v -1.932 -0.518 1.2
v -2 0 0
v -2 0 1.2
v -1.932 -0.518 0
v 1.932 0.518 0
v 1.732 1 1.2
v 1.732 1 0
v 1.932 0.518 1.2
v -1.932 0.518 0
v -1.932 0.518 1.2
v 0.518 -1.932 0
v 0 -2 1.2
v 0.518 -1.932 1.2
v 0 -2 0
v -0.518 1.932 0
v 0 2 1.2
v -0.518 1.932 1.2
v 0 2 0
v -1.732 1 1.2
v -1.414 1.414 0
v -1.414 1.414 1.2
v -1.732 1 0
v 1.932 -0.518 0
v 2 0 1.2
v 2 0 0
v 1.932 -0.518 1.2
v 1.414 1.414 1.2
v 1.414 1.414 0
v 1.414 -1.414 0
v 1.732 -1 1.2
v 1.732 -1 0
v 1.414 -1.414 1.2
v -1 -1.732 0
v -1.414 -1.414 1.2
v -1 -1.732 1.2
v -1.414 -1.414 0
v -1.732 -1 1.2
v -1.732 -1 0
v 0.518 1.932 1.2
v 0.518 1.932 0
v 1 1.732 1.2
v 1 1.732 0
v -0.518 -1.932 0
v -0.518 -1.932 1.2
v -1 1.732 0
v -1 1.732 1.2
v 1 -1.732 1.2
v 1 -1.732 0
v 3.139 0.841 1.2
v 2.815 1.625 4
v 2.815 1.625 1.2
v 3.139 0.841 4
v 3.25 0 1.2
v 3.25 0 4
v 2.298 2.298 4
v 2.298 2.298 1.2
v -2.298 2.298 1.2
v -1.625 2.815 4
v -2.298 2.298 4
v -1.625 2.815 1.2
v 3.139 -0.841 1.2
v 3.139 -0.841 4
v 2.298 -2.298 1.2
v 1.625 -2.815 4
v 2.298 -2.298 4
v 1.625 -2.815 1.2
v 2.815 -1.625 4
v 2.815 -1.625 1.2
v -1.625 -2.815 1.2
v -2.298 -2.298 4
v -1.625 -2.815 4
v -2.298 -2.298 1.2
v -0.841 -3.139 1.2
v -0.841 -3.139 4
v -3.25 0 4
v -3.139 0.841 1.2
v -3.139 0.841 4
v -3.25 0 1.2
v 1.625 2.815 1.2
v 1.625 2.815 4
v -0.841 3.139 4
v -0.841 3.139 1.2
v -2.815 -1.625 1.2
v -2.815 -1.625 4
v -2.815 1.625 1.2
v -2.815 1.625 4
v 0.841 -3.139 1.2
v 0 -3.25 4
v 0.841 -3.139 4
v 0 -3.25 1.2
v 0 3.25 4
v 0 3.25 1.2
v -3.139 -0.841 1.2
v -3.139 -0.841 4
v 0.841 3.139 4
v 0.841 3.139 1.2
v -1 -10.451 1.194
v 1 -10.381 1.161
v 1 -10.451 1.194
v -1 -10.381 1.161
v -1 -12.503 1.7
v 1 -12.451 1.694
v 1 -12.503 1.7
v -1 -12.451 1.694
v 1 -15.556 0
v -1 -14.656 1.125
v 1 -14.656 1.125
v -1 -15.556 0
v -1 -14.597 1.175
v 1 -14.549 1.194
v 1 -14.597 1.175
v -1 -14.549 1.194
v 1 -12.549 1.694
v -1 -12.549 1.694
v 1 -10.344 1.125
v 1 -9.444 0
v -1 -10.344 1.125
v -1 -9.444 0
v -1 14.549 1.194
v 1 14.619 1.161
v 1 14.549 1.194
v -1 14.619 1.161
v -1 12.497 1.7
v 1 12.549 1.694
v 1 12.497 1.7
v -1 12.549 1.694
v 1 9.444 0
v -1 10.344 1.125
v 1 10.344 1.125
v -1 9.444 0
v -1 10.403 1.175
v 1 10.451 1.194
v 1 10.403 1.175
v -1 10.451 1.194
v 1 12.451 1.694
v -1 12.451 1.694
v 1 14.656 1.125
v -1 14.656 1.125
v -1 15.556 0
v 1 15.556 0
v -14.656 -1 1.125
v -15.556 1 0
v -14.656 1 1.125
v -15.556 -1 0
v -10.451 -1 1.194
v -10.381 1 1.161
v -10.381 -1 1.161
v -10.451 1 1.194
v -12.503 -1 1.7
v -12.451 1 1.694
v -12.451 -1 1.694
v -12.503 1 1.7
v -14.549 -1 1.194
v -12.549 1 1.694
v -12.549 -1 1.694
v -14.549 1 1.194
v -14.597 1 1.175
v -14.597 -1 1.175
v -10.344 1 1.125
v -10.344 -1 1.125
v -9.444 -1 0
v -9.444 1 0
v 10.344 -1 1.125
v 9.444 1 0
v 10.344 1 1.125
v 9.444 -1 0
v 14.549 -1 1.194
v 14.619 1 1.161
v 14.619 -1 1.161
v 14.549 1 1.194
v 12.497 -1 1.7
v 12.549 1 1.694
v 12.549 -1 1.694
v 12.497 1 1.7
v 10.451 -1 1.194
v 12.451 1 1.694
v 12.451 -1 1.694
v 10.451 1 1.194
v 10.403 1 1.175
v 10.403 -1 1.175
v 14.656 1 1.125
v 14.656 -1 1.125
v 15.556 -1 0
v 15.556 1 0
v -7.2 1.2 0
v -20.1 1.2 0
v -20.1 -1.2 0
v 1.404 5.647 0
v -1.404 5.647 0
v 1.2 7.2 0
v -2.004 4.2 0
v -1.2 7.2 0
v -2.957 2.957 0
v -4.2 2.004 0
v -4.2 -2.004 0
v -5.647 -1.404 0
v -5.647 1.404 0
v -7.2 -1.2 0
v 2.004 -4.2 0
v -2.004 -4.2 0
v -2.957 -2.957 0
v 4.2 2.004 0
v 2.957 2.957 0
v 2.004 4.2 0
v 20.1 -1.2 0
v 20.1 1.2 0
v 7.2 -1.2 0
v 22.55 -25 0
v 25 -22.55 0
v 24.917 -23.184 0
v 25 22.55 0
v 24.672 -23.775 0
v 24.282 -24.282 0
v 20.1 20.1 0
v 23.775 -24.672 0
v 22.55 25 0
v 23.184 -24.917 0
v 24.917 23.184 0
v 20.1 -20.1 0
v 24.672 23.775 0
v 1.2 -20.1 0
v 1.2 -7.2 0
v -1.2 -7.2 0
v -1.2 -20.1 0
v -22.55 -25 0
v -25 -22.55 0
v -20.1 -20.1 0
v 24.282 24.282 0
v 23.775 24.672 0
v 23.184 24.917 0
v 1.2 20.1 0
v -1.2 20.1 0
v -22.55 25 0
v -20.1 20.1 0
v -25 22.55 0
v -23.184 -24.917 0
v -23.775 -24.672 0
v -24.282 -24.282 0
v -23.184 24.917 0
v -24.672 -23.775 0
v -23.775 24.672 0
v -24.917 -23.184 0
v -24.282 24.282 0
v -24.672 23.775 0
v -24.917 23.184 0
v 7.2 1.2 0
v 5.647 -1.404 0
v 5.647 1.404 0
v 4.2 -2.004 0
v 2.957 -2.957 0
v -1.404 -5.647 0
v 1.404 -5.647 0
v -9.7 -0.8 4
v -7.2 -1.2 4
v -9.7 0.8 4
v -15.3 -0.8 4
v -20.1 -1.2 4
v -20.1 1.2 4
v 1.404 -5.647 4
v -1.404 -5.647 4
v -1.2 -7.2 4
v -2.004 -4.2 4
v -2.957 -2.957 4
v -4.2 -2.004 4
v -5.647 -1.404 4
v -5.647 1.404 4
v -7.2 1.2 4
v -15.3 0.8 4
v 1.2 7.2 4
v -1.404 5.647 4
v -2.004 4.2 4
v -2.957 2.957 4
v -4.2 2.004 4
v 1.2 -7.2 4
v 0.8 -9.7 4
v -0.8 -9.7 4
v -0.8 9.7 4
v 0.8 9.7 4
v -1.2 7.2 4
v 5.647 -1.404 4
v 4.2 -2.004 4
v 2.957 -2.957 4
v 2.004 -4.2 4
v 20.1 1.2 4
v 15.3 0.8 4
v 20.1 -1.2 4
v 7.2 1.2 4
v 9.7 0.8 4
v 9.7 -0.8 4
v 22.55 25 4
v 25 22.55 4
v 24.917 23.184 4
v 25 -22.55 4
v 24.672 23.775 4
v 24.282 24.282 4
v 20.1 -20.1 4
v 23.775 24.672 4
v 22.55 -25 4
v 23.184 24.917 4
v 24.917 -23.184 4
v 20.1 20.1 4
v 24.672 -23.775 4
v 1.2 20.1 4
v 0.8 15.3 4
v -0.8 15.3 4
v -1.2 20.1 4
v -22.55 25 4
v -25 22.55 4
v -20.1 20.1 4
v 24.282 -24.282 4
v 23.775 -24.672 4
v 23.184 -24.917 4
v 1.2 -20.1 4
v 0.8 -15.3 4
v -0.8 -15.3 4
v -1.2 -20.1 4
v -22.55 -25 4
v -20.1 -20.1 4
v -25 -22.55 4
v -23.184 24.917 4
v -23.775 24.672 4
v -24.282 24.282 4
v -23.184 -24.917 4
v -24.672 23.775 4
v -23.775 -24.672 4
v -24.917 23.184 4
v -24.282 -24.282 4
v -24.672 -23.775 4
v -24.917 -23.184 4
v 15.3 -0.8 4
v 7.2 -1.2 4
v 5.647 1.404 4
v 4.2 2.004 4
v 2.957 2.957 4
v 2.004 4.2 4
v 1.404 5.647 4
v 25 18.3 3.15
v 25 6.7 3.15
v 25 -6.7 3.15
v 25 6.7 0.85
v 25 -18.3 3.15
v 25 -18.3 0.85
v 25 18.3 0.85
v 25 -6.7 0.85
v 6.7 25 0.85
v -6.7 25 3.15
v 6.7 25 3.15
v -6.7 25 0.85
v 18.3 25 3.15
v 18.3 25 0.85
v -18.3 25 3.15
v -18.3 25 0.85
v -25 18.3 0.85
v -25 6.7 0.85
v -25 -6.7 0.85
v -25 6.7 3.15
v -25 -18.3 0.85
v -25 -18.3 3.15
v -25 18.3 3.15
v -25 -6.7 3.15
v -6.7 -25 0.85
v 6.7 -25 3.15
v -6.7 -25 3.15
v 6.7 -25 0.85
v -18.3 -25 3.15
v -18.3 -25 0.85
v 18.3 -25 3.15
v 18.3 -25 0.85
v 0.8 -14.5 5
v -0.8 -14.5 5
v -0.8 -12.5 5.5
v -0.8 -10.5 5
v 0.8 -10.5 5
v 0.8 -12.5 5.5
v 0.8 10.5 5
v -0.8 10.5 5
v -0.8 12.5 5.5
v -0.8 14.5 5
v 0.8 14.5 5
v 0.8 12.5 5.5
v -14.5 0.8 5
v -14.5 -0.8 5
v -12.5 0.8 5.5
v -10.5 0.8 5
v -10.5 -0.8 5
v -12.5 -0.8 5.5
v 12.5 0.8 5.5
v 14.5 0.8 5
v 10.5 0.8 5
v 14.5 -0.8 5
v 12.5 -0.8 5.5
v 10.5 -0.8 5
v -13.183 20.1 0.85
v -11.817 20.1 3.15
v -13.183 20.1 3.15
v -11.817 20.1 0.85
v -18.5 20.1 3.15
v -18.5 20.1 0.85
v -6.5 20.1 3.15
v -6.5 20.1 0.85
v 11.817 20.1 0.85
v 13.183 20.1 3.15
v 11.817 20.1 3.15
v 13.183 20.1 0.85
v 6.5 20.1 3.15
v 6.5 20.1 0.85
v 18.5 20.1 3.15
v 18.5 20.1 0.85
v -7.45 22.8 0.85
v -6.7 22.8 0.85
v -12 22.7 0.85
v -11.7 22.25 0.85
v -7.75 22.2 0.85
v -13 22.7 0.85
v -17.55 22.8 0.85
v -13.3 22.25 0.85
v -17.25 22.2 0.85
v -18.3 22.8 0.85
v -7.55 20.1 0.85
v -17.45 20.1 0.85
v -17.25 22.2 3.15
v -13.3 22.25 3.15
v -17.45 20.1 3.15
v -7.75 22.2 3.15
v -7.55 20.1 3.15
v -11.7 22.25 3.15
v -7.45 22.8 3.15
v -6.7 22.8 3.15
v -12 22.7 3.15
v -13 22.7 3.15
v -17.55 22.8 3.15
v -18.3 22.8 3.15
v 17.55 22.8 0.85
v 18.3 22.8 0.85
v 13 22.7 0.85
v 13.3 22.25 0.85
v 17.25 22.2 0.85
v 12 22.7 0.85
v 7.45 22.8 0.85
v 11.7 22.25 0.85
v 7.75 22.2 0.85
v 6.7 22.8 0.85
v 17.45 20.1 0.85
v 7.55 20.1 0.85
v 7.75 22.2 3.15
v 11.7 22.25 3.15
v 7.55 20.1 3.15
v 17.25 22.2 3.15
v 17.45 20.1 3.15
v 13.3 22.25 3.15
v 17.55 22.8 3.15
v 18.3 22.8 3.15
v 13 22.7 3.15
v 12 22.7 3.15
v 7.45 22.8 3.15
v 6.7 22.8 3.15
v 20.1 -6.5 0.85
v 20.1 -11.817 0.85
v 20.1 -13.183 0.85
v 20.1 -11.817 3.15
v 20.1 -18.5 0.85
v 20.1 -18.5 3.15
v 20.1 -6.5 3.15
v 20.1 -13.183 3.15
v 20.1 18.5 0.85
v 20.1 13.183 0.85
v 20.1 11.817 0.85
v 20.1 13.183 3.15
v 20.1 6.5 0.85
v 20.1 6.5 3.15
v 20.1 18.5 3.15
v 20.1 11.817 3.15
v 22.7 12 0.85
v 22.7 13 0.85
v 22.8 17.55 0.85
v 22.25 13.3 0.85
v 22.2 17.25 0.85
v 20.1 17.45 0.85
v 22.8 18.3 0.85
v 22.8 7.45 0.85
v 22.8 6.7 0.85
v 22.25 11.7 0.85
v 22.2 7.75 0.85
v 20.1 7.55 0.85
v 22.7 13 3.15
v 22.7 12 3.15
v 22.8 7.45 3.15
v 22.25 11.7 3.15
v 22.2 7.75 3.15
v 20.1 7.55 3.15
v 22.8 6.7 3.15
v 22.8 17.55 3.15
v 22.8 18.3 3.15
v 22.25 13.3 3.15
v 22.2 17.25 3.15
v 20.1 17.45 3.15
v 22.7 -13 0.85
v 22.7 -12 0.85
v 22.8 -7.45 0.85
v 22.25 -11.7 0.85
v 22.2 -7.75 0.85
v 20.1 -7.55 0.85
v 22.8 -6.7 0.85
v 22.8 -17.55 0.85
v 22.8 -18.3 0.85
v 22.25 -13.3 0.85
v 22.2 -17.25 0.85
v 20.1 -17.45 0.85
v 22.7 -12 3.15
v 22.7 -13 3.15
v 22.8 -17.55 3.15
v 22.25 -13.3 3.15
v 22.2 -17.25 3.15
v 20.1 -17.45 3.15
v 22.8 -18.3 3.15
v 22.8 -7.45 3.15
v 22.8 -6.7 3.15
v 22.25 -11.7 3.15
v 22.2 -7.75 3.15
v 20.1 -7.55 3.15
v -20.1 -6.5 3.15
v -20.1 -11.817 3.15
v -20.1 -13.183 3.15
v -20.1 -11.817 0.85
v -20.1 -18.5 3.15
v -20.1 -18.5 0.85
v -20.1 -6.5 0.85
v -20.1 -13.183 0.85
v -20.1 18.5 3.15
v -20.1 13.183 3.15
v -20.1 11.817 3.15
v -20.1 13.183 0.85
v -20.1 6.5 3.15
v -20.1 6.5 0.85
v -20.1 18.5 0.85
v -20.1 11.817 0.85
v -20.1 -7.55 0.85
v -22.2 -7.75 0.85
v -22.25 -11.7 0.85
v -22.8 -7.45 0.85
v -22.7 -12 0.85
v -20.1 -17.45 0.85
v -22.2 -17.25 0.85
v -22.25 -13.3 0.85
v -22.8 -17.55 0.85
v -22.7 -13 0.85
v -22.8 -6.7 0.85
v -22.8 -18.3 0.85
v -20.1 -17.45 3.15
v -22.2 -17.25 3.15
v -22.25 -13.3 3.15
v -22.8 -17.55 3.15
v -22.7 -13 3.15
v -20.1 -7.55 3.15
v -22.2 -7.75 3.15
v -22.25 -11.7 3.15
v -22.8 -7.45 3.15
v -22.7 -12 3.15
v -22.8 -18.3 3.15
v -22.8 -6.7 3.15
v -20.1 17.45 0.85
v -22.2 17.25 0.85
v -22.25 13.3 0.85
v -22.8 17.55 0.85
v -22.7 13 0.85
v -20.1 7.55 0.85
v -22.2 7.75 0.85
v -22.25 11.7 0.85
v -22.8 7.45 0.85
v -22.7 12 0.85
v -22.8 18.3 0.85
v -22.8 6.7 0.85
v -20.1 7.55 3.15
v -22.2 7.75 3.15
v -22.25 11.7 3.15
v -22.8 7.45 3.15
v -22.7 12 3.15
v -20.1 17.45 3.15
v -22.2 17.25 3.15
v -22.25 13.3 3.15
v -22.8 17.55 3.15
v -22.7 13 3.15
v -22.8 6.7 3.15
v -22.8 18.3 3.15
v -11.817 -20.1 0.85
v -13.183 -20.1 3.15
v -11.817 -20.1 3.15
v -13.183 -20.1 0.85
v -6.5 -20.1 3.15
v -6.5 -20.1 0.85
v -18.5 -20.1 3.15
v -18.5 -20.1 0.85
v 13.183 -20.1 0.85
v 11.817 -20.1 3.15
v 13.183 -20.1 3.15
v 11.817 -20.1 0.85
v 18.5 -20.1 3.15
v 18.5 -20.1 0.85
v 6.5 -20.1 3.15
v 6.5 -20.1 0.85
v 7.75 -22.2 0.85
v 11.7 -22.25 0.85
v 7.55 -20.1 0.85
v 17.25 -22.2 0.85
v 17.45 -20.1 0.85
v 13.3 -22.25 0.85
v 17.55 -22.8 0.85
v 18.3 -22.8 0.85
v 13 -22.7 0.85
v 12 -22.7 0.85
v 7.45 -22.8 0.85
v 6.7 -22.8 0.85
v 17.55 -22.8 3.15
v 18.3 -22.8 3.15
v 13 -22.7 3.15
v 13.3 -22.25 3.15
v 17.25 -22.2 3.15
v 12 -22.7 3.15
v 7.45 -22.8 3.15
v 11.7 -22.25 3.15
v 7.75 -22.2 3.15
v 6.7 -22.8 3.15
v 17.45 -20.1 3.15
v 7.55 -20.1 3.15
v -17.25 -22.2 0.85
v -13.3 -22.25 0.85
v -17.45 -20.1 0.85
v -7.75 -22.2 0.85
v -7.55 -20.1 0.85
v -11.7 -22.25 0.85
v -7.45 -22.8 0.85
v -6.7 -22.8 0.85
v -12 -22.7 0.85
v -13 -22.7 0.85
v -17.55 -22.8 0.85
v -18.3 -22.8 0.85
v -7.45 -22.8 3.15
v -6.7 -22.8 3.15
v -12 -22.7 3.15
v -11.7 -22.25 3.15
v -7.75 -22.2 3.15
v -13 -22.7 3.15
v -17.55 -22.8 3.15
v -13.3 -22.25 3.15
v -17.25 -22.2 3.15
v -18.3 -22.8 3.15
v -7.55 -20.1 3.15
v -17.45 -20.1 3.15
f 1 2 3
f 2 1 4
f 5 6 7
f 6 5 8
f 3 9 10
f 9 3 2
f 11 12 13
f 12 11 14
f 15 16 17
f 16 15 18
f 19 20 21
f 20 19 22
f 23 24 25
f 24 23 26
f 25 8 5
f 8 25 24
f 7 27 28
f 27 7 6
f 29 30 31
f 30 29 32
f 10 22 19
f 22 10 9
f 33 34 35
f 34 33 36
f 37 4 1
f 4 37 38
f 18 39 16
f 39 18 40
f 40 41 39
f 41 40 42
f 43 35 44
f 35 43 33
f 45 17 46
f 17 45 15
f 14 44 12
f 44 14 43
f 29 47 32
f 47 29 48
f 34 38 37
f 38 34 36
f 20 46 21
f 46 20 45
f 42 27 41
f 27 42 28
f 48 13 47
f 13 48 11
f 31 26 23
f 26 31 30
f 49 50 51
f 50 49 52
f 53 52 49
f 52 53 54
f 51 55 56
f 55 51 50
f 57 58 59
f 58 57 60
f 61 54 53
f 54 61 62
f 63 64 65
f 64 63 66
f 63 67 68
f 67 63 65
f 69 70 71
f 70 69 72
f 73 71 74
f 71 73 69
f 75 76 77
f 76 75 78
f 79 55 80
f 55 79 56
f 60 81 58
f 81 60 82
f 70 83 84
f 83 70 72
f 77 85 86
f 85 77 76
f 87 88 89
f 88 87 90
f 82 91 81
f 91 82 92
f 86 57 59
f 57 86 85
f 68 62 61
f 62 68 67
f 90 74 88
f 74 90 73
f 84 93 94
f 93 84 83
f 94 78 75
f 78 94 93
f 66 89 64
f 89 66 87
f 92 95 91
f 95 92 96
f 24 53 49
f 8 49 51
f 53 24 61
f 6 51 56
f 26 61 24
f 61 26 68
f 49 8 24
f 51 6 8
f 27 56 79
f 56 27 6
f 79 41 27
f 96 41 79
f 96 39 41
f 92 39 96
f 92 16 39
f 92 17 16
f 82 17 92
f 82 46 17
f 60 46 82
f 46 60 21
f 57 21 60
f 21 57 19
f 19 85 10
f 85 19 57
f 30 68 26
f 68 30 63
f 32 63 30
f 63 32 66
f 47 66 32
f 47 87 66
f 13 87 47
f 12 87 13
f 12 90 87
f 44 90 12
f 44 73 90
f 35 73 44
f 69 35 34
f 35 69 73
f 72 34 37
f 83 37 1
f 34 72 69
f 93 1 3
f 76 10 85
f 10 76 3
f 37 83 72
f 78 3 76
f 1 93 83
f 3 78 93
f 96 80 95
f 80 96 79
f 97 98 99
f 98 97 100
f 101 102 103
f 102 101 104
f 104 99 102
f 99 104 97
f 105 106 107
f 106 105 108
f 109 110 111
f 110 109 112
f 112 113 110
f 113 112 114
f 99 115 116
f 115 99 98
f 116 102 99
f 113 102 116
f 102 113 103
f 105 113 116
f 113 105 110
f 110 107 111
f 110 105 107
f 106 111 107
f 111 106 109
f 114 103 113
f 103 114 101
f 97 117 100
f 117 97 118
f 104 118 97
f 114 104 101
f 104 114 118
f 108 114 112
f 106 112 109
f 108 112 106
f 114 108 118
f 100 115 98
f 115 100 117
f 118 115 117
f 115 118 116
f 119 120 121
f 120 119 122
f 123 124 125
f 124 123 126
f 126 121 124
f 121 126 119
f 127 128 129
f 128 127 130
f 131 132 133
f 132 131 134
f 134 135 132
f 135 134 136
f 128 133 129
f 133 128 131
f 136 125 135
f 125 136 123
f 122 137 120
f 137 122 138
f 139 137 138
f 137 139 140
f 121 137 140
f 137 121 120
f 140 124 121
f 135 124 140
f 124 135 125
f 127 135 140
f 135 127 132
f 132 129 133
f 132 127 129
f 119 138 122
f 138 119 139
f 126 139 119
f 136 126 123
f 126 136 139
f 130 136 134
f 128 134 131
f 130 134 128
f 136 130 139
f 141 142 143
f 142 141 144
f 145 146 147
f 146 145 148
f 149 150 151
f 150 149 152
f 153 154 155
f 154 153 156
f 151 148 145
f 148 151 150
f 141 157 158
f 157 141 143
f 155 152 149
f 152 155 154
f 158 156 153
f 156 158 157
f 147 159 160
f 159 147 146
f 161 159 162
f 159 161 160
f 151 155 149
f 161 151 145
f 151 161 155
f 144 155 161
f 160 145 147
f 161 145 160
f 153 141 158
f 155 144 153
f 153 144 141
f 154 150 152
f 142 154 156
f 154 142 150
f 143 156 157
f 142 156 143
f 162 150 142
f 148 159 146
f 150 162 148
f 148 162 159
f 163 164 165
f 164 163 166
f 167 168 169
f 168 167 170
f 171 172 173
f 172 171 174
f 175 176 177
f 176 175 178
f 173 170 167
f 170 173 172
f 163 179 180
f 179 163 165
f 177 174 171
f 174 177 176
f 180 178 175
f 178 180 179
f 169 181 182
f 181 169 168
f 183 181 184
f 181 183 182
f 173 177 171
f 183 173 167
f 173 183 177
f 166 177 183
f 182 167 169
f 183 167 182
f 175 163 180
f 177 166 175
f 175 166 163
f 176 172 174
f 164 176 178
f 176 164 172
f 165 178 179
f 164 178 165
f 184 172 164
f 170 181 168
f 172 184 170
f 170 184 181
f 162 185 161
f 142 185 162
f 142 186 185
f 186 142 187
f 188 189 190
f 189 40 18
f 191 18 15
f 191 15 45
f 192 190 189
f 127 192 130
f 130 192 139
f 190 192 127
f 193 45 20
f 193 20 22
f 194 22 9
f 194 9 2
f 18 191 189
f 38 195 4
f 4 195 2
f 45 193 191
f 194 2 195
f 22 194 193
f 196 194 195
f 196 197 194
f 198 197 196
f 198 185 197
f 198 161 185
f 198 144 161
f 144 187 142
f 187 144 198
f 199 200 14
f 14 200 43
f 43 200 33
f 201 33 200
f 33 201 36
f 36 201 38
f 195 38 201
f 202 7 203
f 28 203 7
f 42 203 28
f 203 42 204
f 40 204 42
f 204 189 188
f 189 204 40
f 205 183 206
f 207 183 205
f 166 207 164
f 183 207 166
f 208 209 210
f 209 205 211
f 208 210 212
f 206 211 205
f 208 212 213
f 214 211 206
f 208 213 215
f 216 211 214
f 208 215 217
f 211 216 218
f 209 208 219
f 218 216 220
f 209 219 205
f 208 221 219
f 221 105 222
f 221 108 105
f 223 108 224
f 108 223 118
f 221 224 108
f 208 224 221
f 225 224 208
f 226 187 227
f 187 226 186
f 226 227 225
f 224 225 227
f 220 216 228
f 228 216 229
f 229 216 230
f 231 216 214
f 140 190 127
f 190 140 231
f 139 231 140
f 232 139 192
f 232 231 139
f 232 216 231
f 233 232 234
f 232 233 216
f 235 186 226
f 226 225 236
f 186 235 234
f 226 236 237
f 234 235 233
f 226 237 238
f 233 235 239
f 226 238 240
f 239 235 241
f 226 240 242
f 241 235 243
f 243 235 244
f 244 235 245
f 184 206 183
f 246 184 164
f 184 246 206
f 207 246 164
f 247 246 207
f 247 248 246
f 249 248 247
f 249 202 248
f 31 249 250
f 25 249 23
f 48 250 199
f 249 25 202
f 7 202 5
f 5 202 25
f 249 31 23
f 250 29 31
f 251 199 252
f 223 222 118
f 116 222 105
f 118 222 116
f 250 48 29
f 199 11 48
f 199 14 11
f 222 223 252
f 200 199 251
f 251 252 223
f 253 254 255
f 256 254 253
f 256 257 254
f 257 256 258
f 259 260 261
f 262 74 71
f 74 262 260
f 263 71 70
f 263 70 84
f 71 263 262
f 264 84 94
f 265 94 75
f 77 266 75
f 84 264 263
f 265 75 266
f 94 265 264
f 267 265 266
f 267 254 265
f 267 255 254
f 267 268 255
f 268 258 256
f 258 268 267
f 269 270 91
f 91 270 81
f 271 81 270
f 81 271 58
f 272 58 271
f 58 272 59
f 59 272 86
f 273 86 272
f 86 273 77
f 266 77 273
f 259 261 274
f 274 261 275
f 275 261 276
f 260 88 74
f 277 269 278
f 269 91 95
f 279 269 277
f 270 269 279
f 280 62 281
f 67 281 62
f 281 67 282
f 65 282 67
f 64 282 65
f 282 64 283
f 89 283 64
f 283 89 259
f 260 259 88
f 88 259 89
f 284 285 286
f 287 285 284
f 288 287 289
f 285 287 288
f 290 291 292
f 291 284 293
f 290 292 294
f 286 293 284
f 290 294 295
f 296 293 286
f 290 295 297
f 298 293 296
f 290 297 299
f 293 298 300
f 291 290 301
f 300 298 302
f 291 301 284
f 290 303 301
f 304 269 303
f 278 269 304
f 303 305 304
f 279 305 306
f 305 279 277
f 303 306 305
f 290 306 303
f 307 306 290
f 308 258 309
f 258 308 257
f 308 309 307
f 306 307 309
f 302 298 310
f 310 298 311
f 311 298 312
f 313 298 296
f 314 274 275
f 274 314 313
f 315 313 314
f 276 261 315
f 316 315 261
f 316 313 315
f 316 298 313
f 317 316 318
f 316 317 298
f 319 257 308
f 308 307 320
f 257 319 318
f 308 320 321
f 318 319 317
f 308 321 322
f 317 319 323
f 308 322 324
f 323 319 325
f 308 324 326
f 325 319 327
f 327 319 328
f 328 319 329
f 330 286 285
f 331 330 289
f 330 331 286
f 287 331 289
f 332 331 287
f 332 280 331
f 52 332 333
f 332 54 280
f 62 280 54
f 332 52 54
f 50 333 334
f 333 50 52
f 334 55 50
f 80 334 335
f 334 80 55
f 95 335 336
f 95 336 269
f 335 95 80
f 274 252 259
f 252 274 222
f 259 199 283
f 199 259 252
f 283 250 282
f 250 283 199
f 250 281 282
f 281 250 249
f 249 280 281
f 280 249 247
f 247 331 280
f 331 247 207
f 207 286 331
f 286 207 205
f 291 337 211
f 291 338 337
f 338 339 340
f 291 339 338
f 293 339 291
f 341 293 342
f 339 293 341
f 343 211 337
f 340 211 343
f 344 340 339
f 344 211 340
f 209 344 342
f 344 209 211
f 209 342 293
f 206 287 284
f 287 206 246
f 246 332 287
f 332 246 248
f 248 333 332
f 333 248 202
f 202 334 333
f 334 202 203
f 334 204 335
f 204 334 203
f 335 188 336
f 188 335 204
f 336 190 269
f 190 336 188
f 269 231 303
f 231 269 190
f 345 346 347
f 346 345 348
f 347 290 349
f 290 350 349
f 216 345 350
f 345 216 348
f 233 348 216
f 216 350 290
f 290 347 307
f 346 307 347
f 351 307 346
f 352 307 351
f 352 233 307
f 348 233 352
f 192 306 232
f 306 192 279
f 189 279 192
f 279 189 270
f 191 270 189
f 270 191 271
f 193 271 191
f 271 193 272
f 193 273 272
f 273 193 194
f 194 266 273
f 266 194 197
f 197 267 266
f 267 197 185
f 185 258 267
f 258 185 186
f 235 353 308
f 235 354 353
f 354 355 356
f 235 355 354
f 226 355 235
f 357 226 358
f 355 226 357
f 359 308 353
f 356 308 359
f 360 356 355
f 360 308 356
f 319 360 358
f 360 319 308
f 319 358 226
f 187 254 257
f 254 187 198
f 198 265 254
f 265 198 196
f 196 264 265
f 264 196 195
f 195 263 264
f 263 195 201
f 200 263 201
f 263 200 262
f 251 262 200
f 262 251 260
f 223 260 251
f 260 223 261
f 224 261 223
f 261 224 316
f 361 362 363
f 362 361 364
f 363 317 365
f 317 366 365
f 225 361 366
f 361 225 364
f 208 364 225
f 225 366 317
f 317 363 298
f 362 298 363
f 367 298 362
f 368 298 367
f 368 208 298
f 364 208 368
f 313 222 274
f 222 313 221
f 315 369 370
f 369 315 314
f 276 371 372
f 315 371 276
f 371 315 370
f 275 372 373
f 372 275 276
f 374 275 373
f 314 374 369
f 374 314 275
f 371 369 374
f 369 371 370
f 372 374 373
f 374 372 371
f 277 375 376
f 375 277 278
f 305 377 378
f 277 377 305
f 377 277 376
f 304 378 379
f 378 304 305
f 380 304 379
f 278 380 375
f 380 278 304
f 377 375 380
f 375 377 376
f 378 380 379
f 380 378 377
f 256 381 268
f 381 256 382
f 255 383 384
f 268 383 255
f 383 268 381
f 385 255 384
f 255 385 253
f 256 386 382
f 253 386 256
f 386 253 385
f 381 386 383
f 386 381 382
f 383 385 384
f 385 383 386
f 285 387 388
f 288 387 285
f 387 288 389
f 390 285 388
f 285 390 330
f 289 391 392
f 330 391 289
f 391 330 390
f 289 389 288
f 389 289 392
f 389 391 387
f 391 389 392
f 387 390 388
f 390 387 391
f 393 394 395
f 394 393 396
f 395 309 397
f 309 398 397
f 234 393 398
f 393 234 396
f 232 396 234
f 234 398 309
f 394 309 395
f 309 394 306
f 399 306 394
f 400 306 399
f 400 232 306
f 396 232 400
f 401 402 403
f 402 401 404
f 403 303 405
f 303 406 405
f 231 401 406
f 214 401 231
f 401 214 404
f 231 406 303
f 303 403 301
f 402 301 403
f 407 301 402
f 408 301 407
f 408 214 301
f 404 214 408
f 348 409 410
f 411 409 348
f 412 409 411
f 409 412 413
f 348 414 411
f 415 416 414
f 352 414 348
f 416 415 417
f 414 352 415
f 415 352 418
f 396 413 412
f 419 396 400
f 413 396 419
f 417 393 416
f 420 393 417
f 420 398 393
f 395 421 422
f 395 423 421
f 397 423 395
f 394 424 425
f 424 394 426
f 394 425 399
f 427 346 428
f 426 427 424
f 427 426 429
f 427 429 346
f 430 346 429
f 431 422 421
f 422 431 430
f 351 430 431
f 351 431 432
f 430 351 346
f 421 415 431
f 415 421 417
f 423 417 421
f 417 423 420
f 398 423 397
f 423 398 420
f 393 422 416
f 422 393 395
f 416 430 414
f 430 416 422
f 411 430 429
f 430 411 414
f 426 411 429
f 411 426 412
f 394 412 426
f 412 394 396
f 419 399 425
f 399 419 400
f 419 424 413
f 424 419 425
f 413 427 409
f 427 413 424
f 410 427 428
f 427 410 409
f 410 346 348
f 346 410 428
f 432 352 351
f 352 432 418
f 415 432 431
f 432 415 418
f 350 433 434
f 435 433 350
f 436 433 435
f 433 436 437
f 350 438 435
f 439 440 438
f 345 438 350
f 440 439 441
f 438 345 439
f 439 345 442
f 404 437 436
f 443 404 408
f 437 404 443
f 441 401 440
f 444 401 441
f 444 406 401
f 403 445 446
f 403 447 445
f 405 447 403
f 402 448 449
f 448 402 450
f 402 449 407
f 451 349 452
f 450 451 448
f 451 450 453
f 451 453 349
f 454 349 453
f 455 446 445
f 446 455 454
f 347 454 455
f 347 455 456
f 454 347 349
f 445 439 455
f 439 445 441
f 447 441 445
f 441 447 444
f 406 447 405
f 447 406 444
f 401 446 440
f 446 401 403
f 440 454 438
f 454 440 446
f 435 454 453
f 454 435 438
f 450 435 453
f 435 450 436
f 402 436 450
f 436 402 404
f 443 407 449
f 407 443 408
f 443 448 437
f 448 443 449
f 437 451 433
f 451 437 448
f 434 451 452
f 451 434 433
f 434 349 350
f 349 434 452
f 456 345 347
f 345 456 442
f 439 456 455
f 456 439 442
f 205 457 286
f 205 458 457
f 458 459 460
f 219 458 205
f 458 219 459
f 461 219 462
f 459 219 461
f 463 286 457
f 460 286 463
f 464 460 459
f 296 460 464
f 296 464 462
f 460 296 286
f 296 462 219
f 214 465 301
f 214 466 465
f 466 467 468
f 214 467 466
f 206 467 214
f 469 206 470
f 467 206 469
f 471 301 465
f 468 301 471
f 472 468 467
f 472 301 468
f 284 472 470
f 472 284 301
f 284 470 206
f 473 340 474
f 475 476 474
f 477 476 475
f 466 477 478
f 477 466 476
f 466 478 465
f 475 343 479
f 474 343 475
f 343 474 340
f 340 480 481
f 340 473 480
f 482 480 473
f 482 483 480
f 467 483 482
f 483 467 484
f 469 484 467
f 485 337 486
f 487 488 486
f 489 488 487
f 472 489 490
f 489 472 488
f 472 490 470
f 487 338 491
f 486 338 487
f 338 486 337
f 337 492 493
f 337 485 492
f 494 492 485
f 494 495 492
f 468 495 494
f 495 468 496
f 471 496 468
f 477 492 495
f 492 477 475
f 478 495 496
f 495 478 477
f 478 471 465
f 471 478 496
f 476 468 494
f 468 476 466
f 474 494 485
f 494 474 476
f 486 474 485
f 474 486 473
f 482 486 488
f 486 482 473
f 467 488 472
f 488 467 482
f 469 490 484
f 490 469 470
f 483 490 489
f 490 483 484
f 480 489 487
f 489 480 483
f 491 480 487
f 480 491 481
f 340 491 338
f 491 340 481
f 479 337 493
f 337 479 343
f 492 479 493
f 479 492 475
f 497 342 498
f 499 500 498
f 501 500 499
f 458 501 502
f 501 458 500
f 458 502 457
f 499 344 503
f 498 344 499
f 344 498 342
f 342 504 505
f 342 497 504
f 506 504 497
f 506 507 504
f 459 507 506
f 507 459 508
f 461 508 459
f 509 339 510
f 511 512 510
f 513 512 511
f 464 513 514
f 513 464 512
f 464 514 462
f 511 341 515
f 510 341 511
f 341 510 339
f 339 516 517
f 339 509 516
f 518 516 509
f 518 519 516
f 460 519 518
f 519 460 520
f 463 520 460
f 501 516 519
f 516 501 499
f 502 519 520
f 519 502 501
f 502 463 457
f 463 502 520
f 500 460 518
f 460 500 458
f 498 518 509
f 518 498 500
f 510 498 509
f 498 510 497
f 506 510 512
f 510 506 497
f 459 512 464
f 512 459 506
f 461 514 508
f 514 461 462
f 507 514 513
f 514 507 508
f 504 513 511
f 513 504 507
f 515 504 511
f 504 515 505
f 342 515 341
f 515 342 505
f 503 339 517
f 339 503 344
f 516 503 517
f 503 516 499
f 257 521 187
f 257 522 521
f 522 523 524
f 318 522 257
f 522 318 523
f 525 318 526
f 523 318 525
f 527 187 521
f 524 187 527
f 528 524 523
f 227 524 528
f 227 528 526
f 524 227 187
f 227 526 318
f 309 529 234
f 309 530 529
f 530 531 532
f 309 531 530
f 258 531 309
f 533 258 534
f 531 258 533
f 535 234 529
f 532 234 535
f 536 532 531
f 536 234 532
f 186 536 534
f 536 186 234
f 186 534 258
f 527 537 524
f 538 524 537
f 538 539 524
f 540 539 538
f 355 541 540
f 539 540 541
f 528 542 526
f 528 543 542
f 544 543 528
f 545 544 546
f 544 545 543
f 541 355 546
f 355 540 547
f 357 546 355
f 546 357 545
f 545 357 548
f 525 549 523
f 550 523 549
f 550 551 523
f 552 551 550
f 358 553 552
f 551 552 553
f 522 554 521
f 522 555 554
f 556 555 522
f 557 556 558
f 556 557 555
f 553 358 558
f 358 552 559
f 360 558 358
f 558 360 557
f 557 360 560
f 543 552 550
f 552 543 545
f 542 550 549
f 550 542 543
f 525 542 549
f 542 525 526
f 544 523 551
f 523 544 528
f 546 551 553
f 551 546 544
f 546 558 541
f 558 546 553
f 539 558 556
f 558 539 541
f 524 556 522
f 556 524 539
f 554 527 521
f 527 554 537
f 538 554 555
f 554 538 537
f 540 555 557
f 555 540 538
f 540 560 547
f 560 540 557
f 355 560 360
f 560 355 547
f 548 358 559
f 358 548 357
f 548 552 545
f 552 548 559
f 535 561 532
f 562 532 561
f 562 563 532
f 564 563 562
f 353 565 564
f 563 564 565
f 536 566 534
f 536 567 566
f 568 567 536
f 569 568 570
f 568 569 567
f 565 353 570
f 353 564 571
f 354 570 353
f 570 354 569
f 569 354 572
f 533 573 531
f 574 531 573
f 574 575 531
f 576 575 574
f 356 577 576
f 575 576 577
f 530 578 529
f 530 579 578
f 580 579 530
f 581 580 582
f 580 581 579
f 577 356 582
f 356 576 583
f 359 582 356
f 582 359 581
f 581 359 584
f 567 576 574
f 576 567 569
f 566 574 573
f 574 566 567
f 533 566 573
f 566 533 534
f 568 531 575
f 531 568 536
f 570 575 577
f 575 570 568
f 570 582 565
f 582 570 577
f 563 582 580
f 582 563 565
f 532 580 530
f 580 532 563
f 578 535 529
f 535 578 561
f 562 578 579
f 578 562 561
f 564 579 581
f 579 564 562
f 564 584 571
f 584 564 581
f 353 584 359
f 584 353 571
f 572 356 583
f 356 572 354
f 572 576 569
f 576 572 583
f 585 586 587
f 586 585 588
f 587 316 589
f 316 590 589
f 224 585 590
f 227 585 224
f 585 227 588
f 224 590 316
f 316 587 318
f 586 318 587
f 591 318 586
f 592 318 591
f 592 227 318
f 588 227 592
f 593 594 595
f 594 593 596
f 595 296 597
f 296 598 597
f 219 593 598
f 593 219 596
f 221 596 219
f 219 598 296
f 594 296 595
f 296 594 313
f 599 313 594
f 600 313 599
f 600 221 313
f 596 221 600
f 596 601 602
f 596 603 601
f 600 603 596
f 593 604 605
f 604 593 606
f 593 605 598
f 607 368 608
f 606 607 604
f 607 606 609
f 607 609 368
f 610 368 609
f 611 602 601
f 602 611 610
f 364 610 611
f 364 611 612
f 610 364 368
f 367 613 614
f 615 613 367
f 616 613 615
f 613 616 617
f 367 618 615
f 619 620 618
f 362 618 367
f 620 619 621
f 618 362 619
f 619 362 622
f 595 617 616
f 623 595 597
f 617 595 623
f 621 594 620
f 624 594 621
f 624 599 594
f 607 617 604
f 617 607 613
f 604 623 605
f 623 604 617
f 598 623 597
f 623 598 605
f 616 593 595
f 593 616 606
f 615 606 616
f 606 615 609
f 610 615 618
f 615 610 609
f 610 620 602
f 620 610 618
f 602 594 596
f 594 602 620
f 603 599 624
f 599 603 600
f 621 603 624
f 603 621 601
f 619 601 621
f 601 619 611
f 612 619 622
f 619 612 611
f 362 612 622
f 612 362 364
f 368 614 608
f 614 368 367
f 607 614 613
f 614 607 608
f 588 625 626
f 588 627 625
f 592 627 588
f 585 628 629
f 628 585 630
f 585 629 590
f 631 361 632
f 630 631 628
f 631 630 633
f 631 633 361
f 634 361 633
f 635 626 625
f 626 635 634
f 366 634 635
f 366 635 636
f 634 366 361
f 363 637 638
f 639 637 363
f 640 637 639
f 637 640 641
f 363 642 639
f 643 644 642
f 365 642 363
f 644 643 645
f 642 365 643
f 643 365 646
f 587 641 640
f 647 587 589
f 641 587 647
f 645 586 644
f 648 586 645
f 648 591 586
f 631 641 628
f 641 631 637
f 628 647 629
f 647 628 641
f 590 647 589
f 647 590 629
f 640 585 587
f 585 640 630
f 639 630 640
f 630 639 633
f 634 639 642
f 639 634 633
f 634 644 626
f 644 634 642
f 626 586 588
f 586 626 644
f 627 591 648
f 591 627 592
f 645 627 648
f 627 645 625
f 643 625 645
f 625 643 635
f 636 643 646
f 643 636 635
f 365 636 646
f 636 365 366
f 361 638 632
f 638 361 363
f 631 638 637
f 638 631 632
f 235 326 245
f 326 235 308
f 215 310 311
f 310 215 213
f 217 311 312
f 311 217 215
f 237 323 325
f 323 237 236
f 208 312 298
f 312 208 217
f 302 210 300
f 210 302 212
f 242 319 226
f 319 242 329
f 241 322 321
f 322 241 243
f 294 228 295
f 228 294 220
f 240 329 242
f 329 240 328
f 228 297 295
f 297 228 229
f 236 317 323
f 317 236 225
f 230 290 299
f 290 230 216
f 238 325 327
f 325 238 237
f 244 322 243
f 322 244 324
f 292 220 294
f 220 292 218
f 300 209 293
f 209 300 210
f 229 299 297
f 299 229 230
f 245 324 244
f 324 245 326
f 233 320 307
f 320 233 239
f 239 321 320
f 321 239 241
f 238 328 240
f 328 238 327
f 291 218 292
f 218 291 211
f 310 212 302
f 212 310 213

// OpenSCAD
// file: ../../girl/girl_lock.scad
// Copyright 2025 Natalie Baker // Apache v2 //

include<girl_common.scad>;

girl_lock();

//color("blue")
//translate([0,0,-1]) 
//girl_slot();

module girl_lock(center=true) {
	$fn=12;
	linear_extrude(lock_height, center=center, convexity=2)
	mirror_copy([0,1])
	mirror_copy([1,0])
	_girl_lock_part();
}

module girl_slot(center=true) {
	$fn=12;
	linear_extrude(lock_height+0.4, center=center, convexity=2)
	mirror_copy([0,1])
	mirror_copy([1,0])
	_girl_slot_part();
}

module _girl_slot_part() {
	polygon([
		[           0,      0.00],
		[lock_width/2+0.30, 0.00],
		[lock_width/2+0.30, lock_shoulder+0.2],
		[lock_width/2-0.45, lock_shoulder+0.2],
		[lock_width/2-0.75, 2.80],
		[lock_width/2-0.55, lock_depth],
		[lock_width/2+0.50, lock_depth],
		[lock_width/2+0.50, 8.25],
		[lock_width/2-5.00, 8.25],
		[lock_width/2-4.70, 2.75],
		[lock_width/2-5.00, 2.30],
		[           0,      2.30],
	]);
}

module _girl_lock_part() {
	difference() {
		polygon([
			[           0,      0.00],
			[lock_width/2,      0.00],
			[lock_width/2,      lock_shoulder],
			[lock_width/2-0.95, lock_shoulder],
			[lock_width/2-0.60, lock_depth+0.1],
			[lock_width/2,      lock_depth+0.1],
			[lock_width/2-0.30, 6.20],
			[lock_width/2-2.15, 7.65],
			[lock_width/2-2.60, 7.90],
			[lock_width/2-3.00, 8.00],
			[lock_width/2-3.40, 7.90],
			[lock_width/2-3.60, 7.70],
			[lock_width/2-3.70, 7.45],
			[lock_width/2-3.25, 2.00],
			[           0,      2.00],
		]);
		polygon([
			[lock_width/2-2.10, 1.00],
			[lock_width/2-1.60, 5.50],
			[lock_width/2-2.50, 6.50],
			[lock_width/2-2.20, 1.00],
		]);
	}
}

module mirror_copy(m) {
	mirror(m) children();
	children();	
}
// file: ../../girl/girl_common.scad
// Copyright 2025 Natalie Baker // Apache v2 //

base_size  = 32;
wall_width =  9;

magnet_dia    = 6.2;
magnet_height = 2.8;

lock_height   = 1.9;
lock_depth    = 4.9;
lock_shoulder = 2.0;
lock_width    = 11;

grid_size   = base_size + 2*wall_width;
grid_diag   = sqrt(2*grid_size*grid_size);
grid_height = max(lock_height, magnet_height)+1.2;

frame_size = 2.4;

module mirror_copy(m) {
	mirror(m) children();
	children();	
}

module repeat(size, x, y, z, center) {
	off = center 
		? [(x-1)*size[0],(y-1)*size[1],(z-1)*size[2]]/2 
		: [0,0,0];

	for(i = [0 : x-1])
	for(j = [0 : y-1])
	for(k = [0 : z-1])
		translate([
			size[0]*i-off[0],
			size[1]*j-off[1],
			size[2]*k-off[2]
		]) children();
}
// file: ../../girl/girl_grid.scad
// Copyright 2025 Natalie Baker // Apache v2 //

include<girl_common.scad>;
use<girl_lock.scad>;

grid_grid_map([[1]]);

module grid_grid_map(m) {

	for(y = [0:len(m)-1]) {
		for(x = [0:len(m[y])-1]) {
			translate([x*grid_size, y*grid_size])
			if (m[y][x]) {
				
				tile_px = m[y][x+1] == 1;
				tile_nx = m[y][x-1] == 1;
				tile_py = m[y+1][x] == 1;
				tile_ny = m[y-1][x] == 1;
				
				air_px = m[y][x+1] != 1;
				air_nx = m[y][x-1] != 1;
				air_py = m[y+1][x] != 1;
				air_ny = m[y-1][x] != 1;
				
				air_pxpy = m[y+1][x+1] != 1;
				air_pxny = m[y-1][x+1] != 1;
				air_nxpy = m[y+1][x-1] != 1;
				air_nxny = m[y-1][x-1] != 1;
				
				girl_grid_section(air_px, air_py, air_nx, air_ny);
				
				linear_extrude(grid_height)
				union() {
					if (tile_px && air_pxpy) {
						translate([grid_size/2, (grid_size-lock_depth)/2])
						square([lock_depth*2, lock_depth], center=true);
					}
						
					if (tile_px && air_pxny) {
						translate([grid_size/2, -(grid_size-lock_depth)/2])
						square([lock_depth*2, lock_depth], center=true);
					}
					
					// -- //
				
					if (tile_nx && air_nxpy) {
						translate([-grid_size/2, (grid_size-lock_depth)/2])
						square([lock_depth*2, lock_depth], center=true);
						
					}
						
					if (tile_nx && air_nxny) {
						translate([-grid_size/2, -(grid_size-lock_depth)/2])
						square([lock_depth*2, lock_depth], center=true);
					}
					
					// -- //
				
					if (tile_py && air_pxpy) {
						translate([(grid_size-lock_depth)/2, grid_size/2])
						square([lock_depth, lock_depth*2], center=true);
					}
				
					if (tile_py && air_nxpy) {
						translate([-(grid_size-lock_depth)/2, grid_size/2])
						square([lock_depth, lock_depth*2], center=true);
					}
					
					// -- //
					
					if (tile_ny && air_pxny) {
						translate([(grid_size-lock_depth)/2, -grid_size/2])
						square([lock_depth, lock_depth*2], center=true);
					}
						
					if (tile_ny && air_nxny) {
						translate([-(grid_size-lock_depth)/2, -grid_size/2])
						square([lock_depth, lock_depth*2], center=true);
					}
				}
			}
		}
	}
	
}

module girl_grid_section(x_p, y_p, x_n, y_n) {
	$fn=24;
	intersection() {
		union() {
			_girl_grid_single();
			
			if (x_p)
			rotate(270)
			translate([0,grid_size/2])
			_girl_grid_slots();
			
			if (x_n)
			rotate(90)
			translate([0,grid_size/2])
			_girl_grid_slots();
			
			if (y_p)
			translate([0,grid_size/2,0])
			_girl_grid_slots();
			
			if (y_n)
			rotate(180)
			translate([0,grid_size/2,0])
			_girl_grid_slots();
		}
			
		linear_extrude(grid_height+100, convexity=2)
		offset( lock_depth/2)
		offset(-lock_depth/2)
		square([grid_size,grid_size],center=true);
	}
}


module _girl_grid_slots() {

	difference() {
		translate([-grid_size/2,-lock_depth,0])
			cube([grid_size,lock_depth,grid_height]);

		translate([-grid_size/4,0,grid_height/2])
			girl_slot();

		translate([grid_size/4,0,grid_height/2])
			girl_slot();
	}
		
}

module _girl_grid_single() {
	union() {
		render()
		difference() {
			linear_extrude(grid_height)
			intersection() {
				repeat([grid_diag/2,grid_diag/2,1], 2, 2, 1, true)
					_girl_grid_lattice(grid_diag/2, frame_size, 6.0);
				square(grid_size, center=true);
			}
			
			_girl_grid_magnet_hole();
			_girl_grid_key(frame_size/3*2,  0.2);
		}
		
		translate([0,0,grid_height])
		_girl_grid_key(frame_size/3*2);
	}
}

module _girl_grid_magnet_hole(tolerance=0.15) {
	mad_d = magnet_dia+2*tolerance;
	mag_h = magnet_height+2*tolerance;
	
	translate([0,0,-tolerance])
	cylinder(d=4, h=grid_height-magnet_height+2*tolerance);
	
	translate([0,0,grid_height-magnet_height])
	cylinder(d=mad_d, h=mag_h);
}

module _girl_grid_lattice(size, wall, radius) {
	intersection() {
		offset(-radius)
		offset( radius)
		union() {
			difference() {
				square(size*26, center=true);
				square(size-wall, center=true);
			}
		}
		square(size, center=true);
	}
}

module _girl_grid_key(wall, tolerance=0) {
	translate([0,-grid_size/4,0])
	rotate([0,0,90])
	_girl_grid_key_single(wall, tolerance);

	translate([0,grid_size/4,0])
	rotate([0,0,90])
	_girl_grid_key_single(wall, tolerance);

	translate([-grid_size/4,0,0])
	_girl_grid_key_single(wall, tolerance);

	translate([grid_size/4,0,0])
	_girl_grid_key_single(wall, tolerance);
}

module _girl_grid_key_single(wall, tolerance=0) {
	rotate([90,0,0])
	translate([0,0,-wall/2-tolerance])
	linear_extrude(wall+2*tolerance)
	offset(tolerance)
	polygon([
		[ 0.00,-0.25],
		[ 3.00,-0.25],
		[ 2.00, 1.00],
		[ 0.00, 1.50],
		[-2.00, 1.00],
		[-3.00,-0.25]
	]);
}
// main file
// Copyright 2025 Natalie Baker // Apache v2 //

use<../../girl/girl_grid.scad>;

grid_grid_map([[1]]);
